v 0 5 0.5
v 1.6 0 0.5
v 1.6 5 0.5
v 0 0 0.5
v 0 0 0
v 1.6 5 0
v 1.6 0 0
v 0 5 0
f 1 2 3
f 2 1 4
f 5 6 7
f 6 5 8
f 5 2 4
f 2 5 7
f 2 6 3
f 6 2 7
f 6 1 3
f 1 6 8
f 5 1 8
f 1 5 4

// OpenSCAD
TOLERANCE = 0.05;

BLADE_THICKNESS = 0.5;
BLADE_WIDTH = 1.6;

BLADE_LENGTH = 5;
BLADE_EDGE_INSET = 0.3;

BLADE_POINT_DISTANCE = 1;

cube([BLADE_WIDTH, BLADE_LENGTH, BLADE_THICKNESS]);
